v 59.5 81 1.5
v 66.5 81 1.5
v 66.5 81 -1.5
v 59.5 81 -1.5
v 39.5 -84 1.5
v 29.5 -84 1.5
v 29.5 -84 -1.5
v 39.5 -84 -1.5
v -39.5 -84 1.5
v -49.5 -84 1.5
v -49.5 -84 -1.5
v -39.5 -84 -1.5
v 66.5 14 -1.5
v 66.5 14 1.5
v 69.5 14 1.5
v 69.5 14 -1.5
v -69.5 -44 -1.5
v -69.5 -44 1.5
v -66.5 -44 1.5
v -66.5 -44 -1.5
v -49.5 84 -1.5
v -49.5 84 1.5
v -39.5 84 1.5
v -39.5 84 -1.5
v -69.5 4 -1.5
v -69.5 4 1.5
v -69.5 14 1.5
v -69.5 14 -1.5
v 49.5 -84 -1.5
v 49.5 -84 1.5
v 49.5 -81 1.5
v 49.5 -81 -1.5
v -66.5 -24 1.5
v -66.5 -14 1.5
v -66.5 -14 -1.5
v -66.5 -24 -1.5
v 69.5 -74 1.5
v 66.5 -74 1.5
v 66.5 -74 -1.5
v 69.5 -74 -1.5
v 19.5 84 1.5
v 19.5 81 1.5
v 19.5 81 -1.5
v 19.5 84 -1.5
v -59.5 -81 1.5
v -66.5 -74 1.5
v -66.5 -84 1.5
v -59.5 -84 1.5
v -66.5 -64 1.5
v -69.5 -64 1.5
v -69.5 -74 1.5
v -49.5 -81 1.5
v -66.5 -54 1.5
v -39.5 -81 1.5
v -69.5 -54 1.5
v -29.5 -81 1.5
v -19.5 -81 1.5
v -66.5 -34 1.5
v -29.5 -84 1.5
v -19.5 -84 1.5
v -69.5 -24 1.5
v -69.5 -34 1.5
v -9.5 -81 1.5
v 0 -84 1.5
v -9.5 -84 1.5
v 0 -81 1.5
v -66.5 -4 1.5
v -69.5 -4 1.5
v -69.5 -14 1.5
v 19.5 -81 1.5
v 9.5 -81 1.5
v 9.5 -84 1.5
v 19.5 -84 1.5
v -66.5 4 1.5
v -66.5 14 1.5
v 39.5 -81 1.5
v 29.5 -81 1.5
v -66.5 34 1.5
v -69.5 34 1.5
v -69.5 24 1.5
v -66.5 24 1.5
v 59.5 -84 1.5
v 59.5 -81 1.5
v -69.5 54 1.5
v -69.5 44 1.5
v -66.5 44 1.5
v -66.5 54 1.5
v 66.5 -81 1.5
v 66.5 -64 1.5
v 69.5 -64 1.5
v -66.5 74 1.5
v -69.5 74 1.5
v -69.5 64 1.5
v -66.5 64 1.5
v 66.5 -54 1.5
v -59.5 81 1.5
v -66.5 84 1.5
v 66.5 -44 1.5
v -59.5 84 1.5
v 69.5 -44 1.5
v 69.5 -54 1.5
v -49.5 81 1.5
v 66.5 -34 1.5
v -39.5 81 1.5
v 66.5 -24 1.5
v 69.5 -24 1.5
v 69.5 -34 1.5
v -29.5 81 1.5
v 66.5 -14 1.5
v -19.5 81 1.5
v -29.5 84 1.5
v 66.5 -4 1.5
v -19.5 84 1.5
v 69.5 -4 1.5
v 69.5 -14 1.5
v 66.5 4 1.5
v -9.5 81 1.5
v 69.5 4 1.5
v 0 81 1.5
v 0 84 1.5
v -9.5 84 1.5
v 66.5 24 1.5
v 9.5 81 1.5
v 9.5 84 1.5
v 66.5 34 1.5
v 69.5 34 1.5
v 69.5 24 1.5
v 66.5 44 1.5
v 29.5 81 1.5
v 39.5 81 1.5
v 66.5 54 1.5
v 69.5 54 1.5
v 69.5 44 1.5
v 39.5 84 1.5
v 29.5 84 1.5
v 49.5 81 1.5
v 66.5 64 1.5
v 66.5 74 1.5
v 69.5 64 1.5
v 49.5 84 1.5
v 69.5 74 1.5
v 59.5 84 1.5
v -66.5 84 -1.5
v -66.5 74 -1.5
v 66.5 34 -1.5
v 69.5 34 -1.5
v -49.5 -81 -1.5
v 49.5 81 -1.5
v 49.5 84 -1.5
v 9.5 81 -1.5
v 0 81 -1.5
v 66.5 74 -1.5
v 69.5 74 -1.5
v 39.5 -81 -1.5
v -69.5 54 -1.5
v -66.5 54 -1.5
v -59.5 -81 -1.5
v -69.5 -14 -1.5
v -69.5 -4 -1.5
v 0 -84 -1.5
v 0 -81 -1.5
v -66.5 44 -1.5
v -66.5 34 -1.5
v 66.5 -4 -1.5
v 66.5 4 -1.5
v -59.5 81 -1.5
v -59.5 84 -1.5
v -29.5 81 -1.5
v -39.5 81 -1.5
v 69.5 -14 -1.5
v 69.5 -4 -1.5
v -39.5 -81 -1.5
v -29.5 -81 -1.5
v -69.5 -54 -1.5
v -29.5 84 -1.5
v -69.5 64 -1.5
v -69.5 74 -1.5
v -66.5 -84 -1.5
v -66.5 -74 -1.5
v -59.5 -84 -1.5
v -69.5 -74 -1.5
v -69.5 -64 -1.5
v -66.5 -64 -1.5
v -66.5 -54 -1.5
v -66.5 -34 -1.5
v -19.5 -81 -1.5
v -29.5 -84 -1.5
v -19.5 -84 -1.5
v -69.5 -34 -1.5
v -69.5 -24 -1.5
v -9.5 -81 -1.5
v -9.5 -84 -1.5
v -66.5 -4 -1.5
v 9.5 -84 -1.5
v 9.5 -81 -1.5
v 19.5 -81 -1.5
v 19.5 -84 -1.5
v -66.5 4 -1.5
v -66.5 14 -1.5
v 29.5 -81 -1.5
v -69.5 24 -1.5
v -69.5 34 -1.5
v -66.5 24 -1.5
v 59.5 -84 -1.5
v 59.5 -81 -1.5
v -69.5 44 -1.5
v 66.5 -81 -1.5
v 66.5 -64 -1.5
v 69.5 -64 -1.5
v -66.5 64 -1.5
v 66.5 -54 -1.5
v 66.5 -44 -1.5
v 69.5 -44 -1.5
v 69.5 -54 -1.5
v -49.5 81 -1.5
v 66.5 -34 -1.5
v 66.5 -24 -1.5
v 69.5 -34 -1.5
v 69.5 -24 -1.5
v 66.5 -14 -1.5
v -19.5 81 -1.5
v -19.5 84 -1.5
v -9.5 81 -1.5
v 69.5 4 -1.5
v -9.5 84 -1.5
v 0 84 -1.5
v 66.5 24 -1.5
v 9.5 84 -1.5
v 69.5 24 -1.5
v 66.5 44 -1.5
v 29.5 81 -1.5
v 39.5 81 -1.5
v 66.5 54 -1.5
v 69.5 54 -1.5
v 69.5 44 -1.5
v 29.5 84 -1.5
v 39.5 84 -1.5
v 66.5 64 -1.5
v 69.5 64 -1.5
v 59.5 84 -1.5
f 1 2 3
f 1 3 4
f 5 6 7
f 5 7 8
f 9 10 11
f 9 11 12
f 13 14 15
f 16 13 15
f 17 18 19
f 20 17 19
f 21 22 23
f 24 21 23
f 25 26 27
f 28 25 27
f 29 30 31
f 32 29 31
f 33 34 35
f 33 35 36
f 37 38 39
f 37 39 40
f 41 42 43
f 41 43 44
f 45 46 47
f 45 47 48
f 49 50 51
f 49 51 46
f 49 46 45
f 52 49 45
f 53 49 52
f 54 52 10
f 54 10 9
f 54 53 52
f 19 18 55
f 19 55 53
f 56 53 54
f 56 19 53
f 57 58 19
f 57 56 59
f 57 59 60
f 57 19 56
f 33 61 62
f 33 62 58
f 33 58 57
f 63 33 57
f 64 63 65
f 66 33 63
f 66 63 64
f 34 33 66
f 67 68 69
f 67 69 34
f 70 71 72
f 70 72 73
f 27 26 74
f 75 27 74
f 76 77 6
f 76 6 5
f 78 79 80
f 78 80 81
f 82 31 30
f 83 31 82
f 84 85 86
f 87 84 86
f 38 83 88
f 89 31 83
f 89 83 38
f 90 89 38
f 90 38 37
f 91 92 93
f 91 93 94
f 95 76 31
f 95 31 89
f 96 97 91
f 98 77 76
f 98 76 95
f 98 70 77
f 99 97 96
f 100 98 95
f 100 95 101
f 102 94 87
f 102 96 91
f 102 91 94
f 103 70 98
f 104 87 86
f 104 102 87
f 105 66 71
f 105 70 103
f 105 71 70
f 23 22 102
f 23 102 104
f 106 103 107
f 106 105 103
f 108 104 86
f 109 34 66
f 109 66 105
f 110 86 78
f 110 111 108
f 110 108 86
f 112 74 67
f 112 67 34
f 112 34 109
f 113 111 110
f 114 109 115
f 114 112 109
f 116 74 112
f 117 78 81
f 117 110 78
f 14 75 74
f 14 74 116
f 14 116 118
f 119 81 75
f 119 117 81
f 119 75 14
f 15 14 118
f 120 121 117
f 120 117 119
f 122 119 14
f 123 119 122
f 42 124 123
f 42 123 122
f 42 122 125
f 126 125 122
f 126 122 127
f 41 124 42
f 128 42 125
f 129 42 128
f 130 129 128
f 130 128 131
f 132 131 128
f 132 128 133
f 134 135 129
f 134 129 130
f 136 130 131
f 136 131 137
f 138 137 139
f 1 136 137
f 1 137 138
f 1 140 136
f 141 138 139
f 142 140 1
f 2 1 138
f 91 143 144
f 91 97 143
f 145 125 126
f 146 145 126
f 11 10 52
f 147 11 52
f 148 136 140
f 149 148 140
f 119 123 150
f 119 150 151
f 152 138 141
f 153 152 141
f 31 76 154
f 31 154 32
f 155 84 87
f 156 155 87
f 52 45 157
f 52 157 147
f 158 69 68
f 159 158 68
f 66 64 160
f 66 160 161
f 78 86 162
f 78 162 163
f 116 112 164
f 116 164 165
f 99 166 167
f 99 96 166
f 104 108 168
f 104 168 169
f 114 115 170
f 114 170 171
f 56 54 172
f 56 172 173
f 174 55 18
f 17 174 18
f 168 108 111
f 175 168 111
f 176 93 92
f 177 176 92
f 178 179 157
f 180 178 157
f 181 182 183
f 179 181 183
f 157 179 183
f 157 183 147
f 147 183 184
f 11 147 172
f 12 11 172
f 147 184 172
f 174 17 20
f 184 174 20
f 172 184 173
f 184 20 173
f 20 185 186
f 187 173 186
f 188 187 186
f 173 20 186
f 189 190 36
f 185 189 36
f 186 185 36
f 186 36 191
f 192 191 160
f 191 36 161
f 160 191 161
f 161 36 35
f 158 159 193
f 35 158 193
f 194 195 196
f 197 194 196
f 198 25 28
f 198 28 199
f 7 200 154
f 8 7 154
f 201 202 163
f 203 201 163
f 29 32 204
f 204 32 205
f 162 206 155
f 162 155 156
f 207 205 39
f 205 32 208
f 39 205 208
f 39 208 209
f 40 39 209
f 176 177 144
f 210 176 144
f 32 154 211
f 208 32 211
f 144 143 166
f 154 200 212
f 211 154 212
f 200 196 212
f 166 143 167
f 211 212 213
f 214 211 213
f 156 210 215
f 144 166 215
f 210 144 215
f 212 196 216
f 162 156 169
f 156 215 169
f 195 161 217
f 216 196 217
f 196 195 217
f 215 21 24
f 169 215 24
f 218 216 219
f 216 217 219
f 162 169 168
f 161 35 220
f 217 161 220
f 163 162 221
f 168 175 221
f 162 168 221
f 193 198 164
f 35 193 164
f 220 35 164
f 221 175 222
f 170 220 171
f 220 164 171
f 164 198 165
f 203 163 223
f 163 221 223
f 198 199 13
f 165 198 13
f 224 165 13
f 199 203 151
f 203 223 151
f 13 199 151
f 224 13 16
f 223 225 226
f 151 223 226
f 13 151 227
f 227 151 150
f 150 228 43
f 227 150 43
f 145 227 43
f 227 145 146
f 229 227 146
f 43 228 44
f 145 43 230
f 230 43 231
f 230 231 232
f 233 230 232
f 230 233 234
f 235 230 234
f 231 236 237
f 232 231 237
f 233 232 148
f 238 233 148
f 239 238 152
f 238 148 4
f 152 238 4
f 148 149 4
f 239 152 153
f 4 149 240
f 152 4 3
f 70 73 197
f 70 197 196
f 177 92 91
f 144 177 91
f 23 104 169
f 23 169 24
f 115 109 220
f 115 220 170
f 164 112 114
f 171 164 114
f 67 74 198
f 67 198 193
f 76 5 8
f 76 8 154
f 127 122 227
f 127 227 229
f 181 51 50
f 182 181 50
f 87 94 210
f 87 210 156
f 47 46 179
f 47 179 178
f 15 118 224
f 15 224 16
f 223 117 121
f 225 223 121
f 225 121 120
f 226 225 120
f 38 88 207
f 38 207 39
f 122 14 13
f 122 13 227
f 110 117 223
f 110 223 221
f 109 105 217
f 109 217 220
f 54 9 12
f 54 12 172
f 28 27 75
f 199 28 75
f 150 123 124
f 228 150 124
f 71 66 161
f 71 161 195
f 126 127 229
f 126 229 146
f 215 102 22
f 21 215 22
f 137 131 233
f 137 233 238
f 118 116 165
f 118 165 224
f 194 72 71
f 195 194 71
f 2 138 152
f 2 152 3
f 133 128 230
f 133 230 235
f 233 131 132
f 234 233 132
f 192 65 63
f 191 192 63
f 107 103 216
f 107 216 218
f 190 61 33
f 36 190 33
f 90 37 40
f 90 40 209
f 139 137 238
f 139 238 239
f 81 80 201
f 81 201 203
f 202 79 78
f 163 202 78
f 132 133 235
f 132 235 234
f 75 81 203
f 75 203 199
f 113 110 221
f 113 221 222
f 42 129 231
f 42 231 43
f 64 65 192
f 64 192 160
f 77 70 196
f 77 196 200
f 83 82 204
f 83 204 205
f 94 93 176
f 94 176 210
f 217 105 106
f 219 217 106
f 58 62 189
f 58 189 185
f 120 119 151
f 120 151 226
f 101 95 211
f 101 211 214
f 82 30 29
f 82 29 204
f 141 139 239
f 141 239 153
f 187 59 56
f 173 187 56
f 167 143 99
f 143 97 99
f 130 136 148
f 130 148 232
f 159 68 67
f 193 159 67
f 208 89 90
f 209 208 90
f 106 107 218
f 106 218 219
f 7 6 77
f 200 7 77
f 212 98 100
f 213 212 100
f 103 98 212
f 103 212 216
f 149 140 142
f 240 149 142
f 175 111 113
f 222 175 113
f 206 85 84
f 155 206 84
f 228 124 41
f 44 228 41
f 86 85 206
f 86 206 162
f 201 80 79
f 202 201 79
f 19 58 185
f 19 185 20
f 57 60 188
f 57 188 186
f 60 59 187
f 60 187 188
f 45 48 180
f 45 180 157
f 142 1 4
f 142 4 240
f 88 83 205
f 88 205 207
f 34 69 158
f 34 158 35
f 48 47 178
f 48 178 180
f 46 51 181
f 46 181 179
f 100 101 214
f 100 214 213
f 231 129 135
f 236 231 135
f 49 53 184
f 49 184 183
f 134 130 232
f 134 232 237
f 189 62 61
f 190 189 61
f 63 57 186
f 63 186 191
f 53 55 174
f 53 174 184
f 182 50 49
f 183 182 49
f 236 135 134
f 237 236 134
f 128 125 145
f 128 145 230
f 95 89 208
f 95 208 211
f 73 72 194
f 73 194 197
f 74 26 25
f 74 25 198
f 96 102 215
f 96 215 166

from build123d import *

# Parameters (mm, degrees)
F0_W     = 7
F0_H     = 3
F0_W_2   = 3
F0_H_2   = 10
F0_W_3   = 10
F0_W_4   = 9.5
F1_DEPTH = 1.5


with BuildPart() as f1:
    # F0 (on Top) → F1 (new body, symmetric)
    with BuildSketch(Plane.XY):
        with Locations((-63, 82.5)):
            Rectangle(F0_W, F0_H)
        Polygon((-59.5, 81), (-66.5, 81), (-66.5, 74), (-66.5, 64), (-66.5, 54), (-66.5, 44), (-66.5, 34), (-66.5, 24), (-66.5, 14), (-66.5, 4), (-66.5, 0), (0, 0), (0, 81), (-9.5, 81), (-19.5, 81), (-29.5, 81), (-39.5, 81), (-49.5, 81), align=None)
        with Locations((-68, 69)):
            Rectangle(F0_W_2, F0_H_2)
        with Locations((-44.5, 82.5)):
            Rectangle(F0_W_3, F0_H)
        with Locations((-68, 49)):
            Rectangle(F0_W_2, F0_H_2)
        with Locations((-24.5, 82.5)):
            Rectangle(F0_W_3, F0_H)
        with Locations((-68, 29)):
            Rectangle(F0_W_2, F0_H_2)
        with Locations((-4.75, 82.5)):
            Rectangle(F0_W_4, F0_H)
        with Locations((-68, 9)):
            Rectangle(F0_W_2, F0_H_2)
        Polygon((9.5, 81), (0, 81), (0, 0), (66.5, 0), (66.5, 4), (66.5, 14), (66.5, 24), (66.5, 34), (66.5, 44), (66.5, 54), (66.5, 64), (66.5, 74), (66.5, 81), (59.5, 81), (49.5, 81), (39.5, 81), (29.5, 81), (19.5, 81), align=None)
        with Locations((14.5, 82.5)):
            Rectangle(F0_W_3, F0_H)
        Polygon((0, -81), (0, 0), (-66.5, 0), (-66.5, -4), (-66.5, -14), (-66.5, -24), (-66.5, -34), (-66.5, -44), (-66.5, -54), (-66.5, -64), (-66.5, -74), (-66.5, -81), (-59.5, -81), (-49.5, -81), (-39.5, -81), (-29.5, -81), (-19.5, -81), (-9.5, -81), align=None)
        Polygon((66.5, 0), (0, 0), (0, -81), (9.5, -81), (19.5, -81), (29.5, -81), (39.5, -81), (49.5, -81), (59.5, -81), (66.5, -81), (66.5, -74), (66.5, -64), (66.5, -54), (66.5, -44), (66.5, -34), (66.5, -24), (66.5, -14), (66.5, -4), align=None)
        with Locations((-4.75, -82.5)):
            Rectangle(F0_W_4, F0_H)
        with Locations((34.5, 82.5)):
            Rectangle(F0_W_3, F0_H)
        with Locations((-68, -9)):
            Rectangle(F0_W_2, F0_H_2)
        with Locations((68, 9)):
            Rectangle(F0_W_2, F0_H_2)
        with Locations((68, -9)):
            Rectangle(F0_W_2, F0_H_2)
        with Locations((14.5, -82.5)):
            Rectangle(F0_W_3, F0_H)
        with Locations((-24.5, -82.5)):
            Rectangle(F0_W_3, F0_H)
        with Locations((54.5, 82.5)):
            Rectangle(F0_W_3, F0_H)
        with Locations((-68, -29)):
            Rectangle(F0_W_2, F0_H_2)
        with Locations((68, 29)):
            Rectangle(F0_W_2, F0_H_2)
        with Locations((68, -29)):
            Rectangle(F0_W_2, F0_H_2)
        with Locations((34.5, -82.5)):
            Rectangle(F0_W_3, F0_H)
        with Locations((-44.5, -82.5)):
            Rectangle(F0_W_3, F0_H)
        with Locations((-68, -49)):
            Rectangle(F0_W_2, F0_H_2)
        with Locations((68, 49)):
            Rectangle(F0_W_2, F0_H_2)
        with Locations((68, -49)):
            Rectangle(F0_W_2, F0_H_2)
        with Locations((54.5, -82.5)):
            Rectangle(F0_W_3, F0_H)
        with Locations((-63, -82.5)):
            Rectangle(F0_W, F0_H)
        with Locations((68, 69)):
            Rectangle(F0_W_2, F0_H_2)
        with Locations((-68, -69)):
            Rectangle(F0_W_2, F0_H_2)
        with Locations((68, -69)):
            Rectangle(F0_W_2, F0_H_2)
    extrude(amount=F1_DEPTH, both=True)


solid = f1.part
